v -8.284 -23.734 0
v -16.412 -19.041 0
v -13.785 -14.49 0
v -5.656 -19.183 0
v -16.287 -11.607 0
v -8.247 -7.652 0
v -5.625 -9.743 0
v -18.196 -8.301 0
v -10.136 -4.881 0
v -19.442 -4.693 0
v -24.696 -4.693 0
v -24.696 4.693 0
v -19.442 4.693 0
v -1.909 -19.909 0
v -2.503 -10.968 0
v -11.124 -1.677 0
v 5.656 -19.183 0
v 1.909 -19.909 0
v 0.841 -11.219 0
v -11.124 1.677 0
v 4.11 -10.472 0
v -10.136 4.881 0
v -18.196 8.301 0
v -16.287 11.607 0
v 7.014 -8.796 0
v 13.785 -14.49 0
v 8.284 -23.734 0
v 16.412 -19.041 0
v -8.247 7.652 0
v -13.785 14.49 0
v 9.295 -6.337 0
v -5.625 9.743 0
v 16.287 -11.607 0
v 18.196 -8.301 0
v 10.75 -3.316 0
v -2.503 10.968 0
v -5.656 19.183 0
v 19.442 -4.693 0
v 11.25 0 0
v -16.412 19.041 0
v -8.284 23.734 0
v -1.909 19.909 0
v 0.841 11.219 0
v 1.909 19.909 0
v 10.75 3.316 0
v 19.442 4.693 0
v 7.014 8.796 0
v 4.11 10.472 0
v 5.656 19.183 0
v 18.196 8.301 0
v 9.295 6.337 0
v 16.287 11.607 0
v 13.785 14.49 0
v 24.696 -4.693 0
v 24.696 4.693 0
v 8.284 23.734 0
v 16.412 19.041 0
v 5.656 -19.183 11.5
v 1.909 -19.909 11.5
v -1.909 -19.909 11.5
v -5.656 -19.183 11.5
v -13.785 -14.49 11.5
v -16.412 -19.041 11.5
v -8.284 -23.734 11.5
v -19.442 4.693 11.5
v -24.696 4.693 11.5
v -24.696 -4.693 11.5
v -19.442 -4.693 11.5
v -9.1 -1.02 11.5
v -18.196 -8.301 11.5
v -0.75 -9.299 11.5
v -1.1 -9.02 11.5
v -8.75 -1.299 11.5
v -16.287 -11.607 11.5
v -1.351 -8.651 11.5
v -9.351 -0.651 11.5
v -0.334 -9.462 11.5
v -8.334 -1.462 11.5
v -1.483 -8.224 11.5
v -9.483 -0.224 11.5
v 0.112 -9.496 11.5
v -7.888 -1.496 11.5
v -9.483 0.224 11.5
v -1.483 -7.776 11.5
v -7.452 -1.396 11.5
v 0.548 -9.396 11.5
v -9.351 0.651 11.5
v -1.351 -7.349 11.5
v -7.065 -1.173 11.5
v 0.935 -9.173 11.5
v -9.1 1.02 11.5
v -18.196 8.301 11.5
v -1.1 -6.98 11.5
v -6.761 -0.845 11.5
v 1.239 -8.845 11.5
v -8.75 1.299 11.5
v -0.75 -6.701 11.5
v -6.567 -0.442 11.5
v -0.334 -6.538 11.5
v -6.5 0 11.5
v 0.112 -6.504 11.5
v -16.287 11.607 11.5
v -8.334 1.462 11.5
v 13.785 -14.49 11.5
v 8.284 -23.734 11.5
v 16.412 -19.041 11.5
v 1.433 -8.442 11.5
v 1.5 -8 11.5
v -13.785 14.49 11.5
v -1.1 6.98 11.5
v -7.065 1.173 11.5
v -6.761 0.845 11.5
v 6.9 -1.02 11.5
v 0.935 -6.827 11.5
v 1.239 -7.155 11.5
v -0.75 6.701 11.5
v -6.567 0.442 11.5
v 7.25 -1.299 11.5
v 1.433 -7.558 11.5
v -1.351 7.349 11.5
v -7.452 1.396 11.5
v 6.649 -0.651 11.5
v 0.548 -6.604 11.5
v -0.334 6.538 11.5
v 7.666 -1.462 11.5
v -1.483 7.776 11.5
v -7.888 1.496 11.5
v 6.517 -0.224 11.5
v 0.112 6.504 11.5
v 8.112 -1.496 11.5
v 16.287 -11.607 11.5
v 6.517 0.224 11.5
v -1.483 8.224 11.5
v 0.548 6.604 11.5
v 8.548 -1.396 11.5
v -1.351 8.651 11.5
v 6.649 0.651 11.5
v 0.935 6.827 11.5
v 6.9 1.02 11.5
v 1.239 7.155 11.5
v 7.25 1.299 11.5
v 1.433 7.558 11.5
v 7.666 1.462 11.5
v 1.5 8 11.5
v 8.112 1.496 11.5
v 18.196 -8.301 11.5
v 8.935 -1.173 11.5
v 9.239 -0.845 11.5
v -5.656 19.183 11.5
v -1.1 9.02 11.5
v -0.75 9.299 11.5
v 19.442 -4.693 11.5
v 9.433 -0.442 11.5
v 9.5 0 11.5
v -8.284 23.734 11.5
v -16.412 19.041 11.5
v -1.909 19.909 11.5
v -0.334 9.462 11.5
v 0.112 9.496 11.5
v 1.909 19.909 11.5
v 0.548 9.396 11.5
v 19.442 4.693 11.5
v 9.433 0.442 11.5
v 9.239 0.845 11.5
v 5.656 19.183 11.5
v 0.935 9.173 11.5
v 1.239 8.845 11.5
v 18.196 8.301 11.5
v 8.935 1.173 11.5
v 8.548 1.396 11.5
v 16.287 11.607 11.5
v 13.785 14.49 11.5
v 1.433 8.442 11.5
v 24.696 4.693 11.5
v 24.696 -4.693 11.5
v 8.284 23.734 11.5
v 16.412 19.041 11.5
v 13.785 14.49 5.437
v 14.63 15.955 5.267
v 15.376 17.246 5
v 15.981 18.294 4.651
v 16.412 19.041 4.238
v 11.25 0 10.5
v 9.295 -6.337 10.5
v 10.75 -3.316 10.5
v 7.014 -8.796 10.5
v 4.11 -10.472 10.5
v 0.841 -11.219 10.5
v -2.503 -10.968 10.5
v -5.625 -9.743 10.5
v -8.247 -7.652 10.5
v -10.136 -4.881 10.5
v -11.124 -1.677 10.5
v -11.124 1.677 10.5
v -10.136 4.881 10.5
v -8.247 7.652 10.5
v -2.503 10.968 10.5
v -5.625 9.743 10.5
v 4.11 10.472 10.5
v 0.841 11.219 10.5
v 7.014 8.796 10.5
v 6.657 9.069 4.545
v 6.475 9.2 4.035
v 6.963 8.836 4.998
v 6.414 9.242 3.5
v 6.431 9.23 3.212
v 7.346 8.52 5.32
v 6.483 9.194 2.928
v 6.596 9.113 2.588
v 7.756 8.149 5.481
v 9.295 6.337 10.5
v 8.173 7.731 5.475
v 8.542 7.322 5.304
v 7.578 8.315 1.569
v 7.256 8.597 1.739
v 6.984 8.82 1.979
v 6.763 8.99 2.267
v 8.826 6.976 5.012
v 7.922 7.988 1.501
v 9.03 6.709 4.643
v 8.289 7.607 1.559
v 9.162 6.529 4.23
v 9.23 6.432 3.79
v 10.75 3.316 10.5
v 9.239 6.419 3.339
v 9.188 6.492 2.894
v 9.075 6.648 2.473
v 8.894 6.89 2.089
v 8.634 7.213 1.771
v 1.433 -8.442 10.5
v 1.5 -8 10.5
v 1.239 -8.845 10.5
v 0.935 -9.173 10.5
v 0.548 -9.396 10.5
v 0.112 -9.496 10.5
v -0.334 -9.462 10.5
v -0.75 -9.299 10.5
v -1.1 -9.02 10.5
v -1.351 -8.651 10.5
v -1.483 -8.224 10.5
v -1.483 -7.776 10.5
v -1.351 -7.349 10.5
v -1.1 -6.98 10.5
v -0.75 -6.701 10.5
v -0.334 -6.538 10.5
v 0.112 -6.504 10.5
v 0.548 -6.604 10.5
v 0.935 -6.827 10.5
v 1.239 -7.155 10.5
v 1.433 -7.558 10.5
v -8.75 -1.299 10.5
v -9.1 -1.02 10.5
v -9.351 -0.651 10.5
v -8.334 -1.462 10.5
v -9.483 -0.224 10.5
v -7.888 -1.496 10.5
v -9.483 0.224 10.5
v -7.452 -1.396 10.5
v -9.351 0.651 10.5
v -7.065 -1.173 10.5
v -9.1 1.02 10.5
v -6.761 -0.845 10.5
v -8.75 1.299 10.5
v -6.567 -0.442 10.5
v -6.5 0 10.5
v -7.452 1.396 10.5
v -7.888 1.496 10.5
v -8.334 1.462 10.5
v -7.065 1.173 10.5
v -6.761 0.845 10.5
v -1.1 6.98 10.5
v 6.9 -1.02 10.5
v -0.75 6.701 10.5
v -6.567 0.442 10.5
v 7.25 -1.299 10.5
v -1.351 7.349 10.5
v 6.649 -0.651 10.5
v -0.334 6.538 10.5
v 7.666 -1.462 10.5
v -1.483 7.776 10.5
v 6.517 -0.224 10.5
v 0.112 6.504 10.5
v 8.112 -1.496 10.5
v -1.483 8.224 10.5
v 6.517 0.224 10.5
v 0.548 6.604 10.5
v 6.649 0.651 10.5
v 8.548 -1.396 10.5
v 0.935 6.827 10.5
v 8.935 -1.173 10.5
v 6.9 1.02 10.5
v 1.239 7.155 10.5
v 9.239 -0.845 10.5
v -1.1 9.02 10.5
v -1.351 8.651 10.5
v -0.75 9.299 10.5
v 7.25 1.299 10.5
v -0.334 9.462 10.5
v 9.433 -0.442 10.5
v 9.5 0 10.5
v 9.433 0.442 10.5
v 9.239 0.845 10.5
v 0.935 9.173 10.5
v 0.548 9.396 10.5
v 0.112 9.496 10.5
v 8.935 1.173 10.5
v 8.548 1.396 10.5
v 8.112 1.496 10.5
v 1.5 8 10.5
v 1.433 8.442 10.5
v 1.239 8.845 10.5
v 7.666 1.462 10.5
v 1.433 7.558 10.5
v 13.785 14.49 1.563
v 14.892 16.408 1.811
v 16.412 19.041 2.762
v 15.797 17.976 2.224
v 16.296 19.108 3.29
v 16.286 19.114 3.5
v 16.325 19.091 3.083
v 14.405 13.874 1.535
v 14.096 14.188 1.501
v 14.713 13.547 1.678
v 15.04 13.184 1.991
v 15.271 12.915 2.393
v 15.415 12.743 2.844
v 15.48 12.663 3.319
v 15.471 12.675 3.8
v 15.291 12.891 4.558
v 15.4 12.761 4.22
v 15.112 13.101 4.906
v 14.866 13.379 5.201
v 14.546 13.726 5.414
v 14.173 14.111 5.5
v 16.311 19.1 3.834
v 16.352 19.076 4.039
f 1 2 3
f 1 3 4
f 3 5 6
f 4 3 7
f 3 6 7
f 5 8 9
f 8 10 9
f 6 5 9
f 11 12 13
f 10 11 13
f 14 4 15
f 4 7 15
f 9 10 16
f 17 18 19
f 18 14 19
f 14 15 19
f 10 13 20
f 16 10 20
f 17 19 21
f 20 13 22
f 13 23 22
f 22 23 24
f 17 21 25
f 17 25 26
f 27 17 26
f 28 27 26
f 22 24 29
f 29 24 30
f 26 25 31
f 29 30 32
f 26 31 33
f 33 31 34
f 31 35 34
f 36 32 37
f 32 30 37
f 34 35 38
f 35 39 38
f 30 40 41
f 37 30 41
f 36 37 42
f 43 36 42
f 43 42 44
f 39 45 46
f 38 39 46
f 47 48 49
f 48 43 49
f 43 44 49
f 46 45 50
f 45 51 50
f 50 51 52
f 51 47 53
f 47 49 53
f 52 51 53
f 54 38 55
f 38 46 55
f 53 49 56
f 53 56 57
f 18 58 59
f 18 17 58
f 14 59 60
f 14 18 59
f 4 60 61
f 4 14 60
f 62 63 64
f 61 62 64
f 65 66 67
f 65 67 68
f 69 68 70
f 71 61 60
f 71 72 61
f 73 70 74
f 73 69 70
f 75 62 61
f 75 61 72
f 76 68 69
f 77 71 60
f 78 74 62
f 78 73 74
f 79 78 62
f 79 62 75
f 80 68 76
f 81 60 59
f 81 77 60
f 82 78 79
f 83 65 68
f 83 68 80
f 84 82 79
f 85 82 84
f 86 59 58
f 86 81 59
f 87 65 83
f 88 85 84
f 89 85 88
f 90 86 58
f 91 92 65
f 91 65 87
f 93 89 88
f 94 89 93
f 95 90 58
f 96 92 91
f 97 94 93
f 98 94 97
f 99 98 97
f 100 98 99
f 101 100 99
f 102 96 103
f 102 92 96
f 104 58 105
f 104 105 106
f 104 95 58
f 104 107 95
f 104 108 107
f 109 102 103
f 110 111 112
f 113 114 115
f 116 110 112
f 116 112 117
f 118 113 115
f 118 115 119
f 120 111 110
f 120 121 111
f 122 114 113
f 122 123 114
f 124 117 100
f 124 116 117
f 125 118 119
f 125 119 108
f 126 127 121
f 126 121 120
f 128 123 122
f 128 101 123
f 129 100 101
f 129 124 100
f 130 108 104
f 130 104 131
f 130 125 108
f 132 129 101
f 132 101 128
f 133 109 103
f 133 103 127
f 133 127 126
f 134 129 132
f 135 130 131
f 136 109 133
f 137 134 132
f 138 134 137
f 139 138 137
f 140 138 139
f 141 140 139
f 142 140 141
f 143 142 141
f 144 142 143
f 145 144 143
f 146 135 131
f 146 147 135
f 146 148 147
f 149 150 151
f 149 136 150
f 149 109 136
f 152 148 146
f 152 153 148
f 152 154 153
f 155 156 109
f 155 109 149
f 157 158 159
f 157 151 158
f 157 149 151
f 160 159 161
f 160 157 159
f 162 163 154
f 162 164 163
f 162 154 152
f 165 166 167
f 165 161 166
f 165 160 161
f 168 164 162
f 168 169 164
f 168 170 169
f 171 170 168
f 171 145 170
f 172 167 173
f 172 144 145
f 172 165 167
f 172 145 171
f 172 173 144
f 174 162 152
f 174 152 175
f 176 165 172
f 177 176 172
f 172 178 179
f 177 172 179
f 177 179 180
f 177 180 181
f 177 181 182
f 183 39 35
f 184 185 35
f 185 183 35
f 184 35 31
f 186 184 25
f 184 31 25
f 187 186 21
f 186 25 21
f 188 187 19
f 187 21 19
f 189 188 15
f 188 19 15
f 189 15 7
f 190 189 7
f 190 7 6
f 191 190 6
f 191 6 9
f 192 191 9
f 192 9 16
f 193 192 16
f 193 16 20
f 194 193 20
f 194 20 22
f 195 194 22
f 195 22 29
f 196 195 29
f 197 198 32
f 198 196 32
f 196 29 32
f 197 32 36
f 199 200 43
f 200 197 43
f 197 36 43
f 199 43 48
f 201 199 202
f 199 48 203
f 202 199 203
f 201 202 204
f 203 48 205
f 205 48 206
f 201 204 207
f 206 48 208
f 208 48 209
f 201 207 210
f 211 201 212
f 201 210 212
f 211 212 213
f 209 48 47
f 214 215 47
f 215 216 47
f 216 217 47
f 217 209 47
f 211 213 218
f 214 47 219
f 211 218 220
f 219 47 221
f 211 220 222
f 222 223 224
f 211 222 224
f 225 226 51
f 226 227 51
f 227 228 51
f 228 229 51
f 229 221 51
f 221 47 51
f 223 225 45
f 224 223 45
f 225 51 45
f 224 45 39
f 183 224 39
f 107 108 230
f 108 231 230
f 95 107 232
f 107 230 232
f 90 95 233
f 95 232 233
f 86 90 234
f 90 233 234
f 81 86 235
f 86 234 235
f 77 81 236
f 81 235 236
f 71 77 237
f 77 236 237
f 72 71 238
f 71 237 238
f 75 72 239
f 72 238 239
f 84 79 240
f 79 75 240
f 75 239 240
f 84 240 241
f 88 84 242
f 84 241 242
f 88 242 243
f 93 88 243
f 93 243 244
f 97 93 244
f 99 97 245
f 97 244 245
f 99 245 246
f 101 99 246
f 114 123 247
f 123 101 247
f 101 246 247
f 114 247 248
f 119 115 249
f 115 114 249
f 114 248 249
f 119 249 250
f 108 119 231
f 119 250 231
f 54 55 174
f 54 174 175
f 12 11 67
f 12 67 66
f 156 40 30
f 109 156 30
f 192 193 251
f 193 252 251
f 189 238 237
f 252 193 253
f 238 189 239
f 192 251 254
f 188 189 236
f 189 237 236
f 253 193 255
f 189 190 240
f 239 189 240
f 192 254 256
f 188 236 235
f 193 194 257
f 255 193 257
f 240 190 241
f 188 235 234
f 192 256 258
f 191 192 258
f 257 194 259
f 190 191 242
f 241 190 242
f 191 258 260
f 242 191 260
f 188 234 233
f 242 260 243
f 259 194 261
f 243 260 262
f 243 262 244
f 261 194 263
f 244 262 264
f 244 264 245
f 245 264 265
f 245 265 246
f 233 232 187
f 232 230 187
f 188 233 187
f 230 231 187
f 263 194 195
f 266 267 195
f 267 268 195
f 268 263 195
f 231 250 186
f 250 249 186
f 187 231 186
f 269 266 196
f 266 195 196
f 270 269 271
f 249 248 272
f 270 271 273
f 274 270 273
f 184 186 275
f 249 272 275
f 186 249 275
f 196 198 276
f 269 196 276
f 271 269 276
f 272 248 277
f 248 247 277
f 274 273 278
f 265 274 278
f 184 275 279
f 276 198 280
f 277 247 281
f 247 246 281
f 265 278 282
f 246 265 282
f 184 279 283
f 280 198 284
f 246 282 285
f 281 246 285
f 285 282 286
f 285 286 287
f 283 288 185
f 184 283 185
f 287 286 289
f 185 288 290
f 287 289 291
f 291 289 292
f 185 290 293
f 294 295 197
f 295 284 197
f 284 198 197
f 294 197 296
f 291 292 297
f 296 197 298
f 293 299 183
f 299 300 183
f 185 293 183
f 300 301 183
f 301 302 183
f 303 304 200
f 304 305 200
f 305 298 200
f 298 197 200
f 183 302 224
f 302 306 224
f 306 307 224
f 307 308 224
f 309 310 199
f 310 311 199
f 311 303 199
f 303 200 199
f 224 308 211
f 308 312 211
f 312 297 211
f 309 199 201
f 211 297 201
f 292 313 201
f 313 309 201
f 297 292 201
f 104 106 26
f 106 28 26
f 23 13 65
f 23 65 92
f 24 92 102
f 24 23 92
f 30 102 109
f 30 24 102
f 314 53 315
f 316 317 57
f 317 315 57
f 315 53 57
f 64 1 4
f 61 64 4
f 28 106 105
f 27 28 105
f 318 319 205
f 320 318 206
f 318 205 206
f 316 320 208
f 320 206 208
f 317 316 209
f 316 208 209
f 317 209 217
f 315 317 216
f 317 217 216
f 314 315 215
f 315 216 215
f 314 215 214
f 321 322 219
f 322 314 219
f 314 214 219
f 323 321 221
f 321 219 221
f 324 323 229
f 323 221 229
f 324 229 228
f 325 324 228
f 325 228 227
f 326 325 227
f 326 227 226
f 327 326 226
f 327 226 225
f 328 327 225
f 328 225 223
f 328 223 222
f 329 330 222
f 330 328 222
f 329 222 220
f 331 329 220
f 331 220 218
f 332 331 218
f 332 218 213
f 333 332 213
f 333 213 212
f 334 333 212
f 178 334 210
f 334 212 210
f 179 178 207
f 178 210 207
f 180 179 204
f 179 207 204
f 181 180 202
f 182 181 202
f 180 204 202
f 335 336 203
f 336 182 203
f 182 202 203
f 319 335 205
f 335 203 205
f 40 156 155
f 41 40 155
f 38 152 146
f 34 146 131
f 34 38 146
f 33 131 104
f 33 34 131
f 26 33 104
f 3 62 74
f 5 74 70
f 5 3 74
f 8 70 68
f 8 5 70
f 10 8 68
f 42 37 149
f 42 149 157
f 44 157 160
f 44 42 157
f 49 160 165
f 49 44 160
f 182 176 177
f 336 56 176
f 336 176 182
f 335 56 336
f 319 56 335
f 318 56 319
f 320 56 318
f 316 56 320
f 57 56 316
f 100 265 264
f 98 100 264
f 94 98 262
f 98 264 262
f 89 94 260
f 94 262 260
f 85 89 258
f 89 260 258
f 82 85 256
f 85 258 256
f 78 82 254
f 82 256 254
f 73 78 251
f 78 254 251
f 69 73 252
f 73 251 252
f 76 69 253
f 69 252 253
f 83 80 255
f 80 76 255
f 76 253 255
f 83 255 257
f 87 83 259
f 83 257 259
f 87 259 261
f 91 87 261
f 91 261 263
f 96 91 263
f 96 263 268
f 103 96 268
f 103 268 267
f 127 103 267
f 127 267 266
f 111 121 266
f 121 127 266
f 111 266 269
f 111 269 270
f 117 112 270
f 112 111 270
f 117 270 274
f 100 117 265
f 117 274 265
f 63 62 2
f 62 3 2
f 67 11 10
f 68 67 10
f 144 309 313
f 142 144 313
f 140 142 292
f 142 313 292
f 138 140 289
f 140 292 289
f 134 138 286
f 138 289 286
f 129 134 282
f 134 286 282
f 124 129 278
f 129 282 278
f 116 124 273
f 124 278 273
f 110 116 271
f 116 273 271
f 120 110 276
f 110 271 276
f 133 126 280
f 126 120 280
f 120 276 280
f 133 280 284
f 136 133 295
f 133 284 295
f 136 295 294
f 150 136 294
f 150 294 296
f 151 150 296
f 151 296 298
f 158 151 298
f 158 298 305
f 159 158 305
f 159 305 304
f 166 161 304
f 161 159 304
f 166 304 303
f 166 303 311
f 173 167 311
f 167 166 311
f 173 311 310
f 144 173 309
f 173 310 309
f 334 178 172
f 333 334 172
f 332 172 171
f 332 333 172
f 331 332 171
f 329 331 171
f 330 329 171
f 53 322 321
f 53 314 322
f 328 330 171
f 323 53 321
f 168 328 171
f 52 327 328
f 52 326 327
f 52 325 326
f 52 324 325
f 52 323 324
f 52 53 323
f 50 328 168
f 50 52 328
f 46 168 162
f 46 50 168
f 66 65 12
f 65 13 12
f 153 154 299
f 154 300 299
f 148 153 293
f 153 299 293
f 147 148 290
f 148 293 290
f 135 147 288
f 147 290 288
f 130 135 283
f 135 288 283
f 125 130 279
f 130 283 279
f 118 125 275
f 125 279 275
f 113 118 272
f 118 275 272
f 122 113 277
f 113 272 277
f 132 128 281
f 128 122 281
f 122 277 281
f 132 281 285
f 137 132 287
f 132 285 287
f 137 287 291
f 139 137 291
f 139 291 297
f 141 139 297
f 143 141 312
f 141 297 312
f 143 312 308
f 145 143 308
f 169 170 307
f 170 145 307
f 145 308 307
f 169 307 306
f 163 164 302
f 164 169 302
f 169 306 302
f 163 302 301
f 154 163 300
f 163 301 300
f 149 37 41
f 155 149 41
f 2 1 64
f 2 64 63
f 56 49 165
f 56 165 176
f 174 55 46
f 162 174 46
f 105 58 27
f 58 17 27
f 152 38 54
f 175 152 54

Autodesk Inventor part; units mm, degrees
ref_plane "YZ Plane" through (0, 0, 0) normal (1, 0, 0) x (0, 1, 0)
sketch "Эскиз1" plane through (0, 0, 0) normal (0, 0, 1) x (1, 0, 0)
  line L0 (0, 0) -> (34.5691, 5.4752) construction
  line L1 (0, 0) -> (35, 0) construction
  line L2 (0, 0) -> (34.5691, -5.4752) construction
  circle A0 centre (0, 0) radius 11.25
  circle A1 centre (0, 0) radius 15
  circle A2 centre (0, 0) radius 20
  circle A3 centre (0, 0) radius 30.0525
  circle A4 centre (0, 0) radius 32.0038
  circle A5 centre (0, 0) radius 35
  line L3 (0, 0) -> (17.5, -30.3109) construction
  circle A6 centre (0, -8) radius 1.5
  circle A7 centre (-8, 0) radius 1.5
  line L4 (0, 0) -> (-35, 0) construction
  line L5 (-29.6307, -4.693) -> (-19.4416, -4.693) construction
  line L6 (-29.6307, -4.693) -> (-19.4416, -4.693)
  line L7 (-29.6839, -4.693) -> (-29.6839, 4.693)
  line L8 (-19.4416, 4.693) -> (-34.6839, 4.693) construction
  line L9 (-19.4416, -4.693) -> (-34.6839, -4.693) construction
  line L10 (10.751, 28.0074) -> (5.6565, 19.1834) construction
  line L11 (5.6565, 19.1834) -> (13.2777, 32.3837) construction
  line L12 (-5.6565, 19.1834) -> (-13.2777, 32.3837) construction
  circle A8 centre (0, 8) radius 1.5
  line L13 (0, 0) -> (-17.5, 30.3109) construction
  line L14 (-5.6565, 19.1834) -> (-13.2777, 32.3837)
  line L15 (0, 0) -> (17.5, 30.3109) construction
  line L16 (0, 0) -> (-17.5, -30.3109) construction
  line L17 (5.6565, 19.1834) -> (13.2777, 32.3837)
  line L18 (13.3758, 26.5536) -> (16.0133, 31.1219)
  line L19 (16.3082, 24.8605) -> (18.9457, 29.4289)
  line L20 (18.9457, 29.4289) -> (17.4457, 26.8308) construction
  line L21 (29.6307, 4.693) -> (19.4416, 4.693)
  line L22 (18.8796, -23.3144) -> (13.7851, -14.4904) construction
  line L23 (13.7851, -14.4904) -> (21.4063, -27.6907) construction
  line L24 (29.6839, 4.693) -> (29.6839, 1.693)
  line L25 (29.6839, 4.693) -> (29.6839, -4.693)
  line L26 (29.6839, -4.693) -> (29.6839, -1.693) construction
  circle A9 centre (8, 0) radius 1.5
  line L27 (-18.8796, 23.3144) -> (-13.7851, 14.4904) construction
  line L28 (-13.7851, 14.4904) -> (-21.4063, 27.6907) construction
  line L29 (-18.8796, 23.3144) -> (-13.7851, 14.4904)
  line L30 (-13.7851, 14.4904) -> (-21.4063, 27.6907)
  line L31 (-18.9063, 23.3605) -> (-10.7777, 28.0536)
  line L32 (-16.3082, 24.8605) -> (-18.9457, 29.4289)
  line L33 (-13.3758, 26.5536) -> (-16.0133, 31.1219)
  line L34 (-13.7851, -14.4904) -> (-21.4063, -27.6907) construction
  line L35 (-10.751, -28.0074) -> (-5.6565, -19.1834) construction
  line L36 (-13.7851, -14.4904) -> (-21.4063, -27.6907)
  line L37 (-10.751, -28.0074) -> (-5.6565, -19.1834)
  line L38 (13.7851, 14.4904) -> (21.4063, 27.6907) construction
  line L39 (21.4063, 27.6907) -> (20.1674, 25.5449) construction
  line L40 (10.7777, 28.0536) -> (18.9063, 23.3605)
  line L41 (13.7851, 14.4904) -> (21.4063, 27.6907)
  line L42 (10.751, 28.0074) -> (5.6565, 19.1834)
  line L43 (0, 0) -> (21.2118, 27.8399) construction
  line L44 (0, 0) -> (8, 0) construction
  line L45 (0, 0) -> (0, 8) construction
  line L46 (-10.7777, -28.0536) -> (-18.9063, -23.3605)
  line L47 (-13.3758, -26.5536) -> (-16.0133, -31.1219)
  line L48 (-16.3082, -24.8605) -> (-18.9457, -29.4289)
  line L49 (-5.6565, -19.1834) -> (-13.2777, -32.3837) construction
  line L50 (5.6565, -19.1834) -> (13.2777, -32.3837) construction
  line L51 (-5.6565, -19.1834) -> (-13.2777, -32.3837)
  line L52 (18.8796, -23.3144) -> (13.7851, -14.4904)
  line L53 (5.6565, -19.1834) -> (13.2777, -32.3837)
  line L54 (16.3082, -24.8605) -> (18.9457, -29.4289)
  line L55 (13.7851, -14.4904) -> (21.4063, -27.6907)
  line L56 (13.3758, -26.5536) -> (16.0133, -31.1219)
  line L57 (18.9063, -23.3605) -> (10.7777, -28.0536)
  line L58 (27.6414, 16.1308) -> (28.831, 19.8437)
  line L59 (24.938, 20.0584) -> (28.831, 19.8437)
  line L60 (24.7499, 20.2901) -> (25.3388, 24.1443)
  line L61 (21.4607, 23.742) -> (25.3388, 24.1443)
  line L62 (17.4457, 26.8308) -> (21.2118, 27.8399)
  line L63 (21.2384, 23.9411) -> (21.2118, 27.8399)
  line L64 (-19.4416, 4.693) -> (-34.6839, 4.693)
  line L65 (-17.4453, 26.8311) -> (-21.2113, 27.8403)
  line L66 (-21.238, 23.9415) -> (-21.2113, 27.8403)
  line L67 (-21.4603, 23.7424) -> (-25.3384, 24.1447)
  line L68 (-24.7496, 20.2905) -> (-25.3384, 24.1447)
  line L69 (-24.9377, 20.0588) -> (-28.8307, 19.8442)
  line L70 (-27.6411, 16.1312) -> (-28.8307, 19.8442)
  line L71 (-27.7903, 15.8727) -> (-31.6007, 15.0465)
  line L72 (-29.8401, 11.5678) -> (-31.6007, 15.0465)
  line L73 (-29.9467, 11.289) -> (-33.5789, 9.8719)
  line L74 (-31.2916, 6.7145) -> (-33.5789, 9.8719)
  line L75 (-31.3528, 6.4224) -> (-34.716, 4.45)
  line L76 (-29.6839, -1.693) -> (-34.959, -1.693)
  line L77 (-19.4416, -4.693) -> (-34.6839, -4.693)
  line L78 (-29.6839, 1.693) -> (-34.959, 1.693)
  line L79 (-31.959, 1.693) -> (-34.716, 4.45)
  line L80 (-31.9591, -1.6925) -> (-34.716, -4.4494)
  line L81 (-31.3529, -6.4219) -> (-34.716, -4.4494)
  line L82 (-31.2917, -6.714) -> (-33.5791, -9.8714)
  line L83 (-29.9469, -11.2885) -> (-33.5791, -9.8714)
  line L84 (-29.8403, -11.5673) -> (-31.6009, -15.046)
  line L85 (-27.7906, -15.8723) -> (-31.6009, -15.046)
  line L86 (-24.938, -20.0584) -> (-28.831, -19.8437)
  line L87 (-27.6414, -16.1308) -> (-28.831, -19.8437)
  line L88 (-17.4457, -26.8308) -> (-21.2118, -27.8399)
  line L89 (-21.2384, -23.9411) -> (-21.2118, -27.8399)
  line L90 (-21.4607, -23.742) -> (-25.3388, -24.1443)
  line L91 (-24.7499, -20.2901) -> (-25.3388, -24.1443)
  line L92 (-14.5138, -28.5236) -> (-13.5047, -32.2897)
  line L93 (-10.1149, -30.3634) -> (-13.5047, -32.2897)
  line L94 (-9.8313, -30.4564) -> (-8.2407, -34.016)
  line L95 (-5.1973, -31.579) -> (-8.2407, -34.016)
  line L96 (-4.9026, -31.6261) -> (-2.7702, -34.8902)
  line L97 (-0.1495, -32.0035) -> (-2.7702, -34.8902)
  line L98 (0.149, -32.0035) -> (2.7697, -34.8902)
  line L99 (-14.5133, 28.5238) -> (-13.5042, 32.2899)
  line L100 (-10.1144, 30.3635) -> (-13.5042, 32.2899)
  line L101 (-9.8308, 30.4565) -> (-8.2401, 34.0162)
  line L102 (-5.1968, 31.5791) -> (-8.2401, 34.0162)
  line L103 (14.5138, 28.5236) -> (13.5047, 32.2897)
  line L104 (10.1149, 30.3634) -> (13.5047, 32.2897)
  line L105 (9.8313, 30.4564) -> (8.2407, 34.016)
  line L106 (5.1973, 31.579) -> (8.2407, 34.016)
  line L107 (4.9026, 31.6261) -> (2.7702, 34.8902)
  line L108 (0.1495, 32.0035) -> (2.7702, 34.8902)
  line L109 (-4.9021, 31.6262) -> (-2.7697, 34.8902)
  line L110 (-0.149, 32.0035) -> (-2.7697, 34.8902)
  line L111 (14.5133, -28.5238) -> (13.5042, -32.2899)
  line L112 (5.1968, -31.5791) -> (8.2401, -34.0162)
  line L113 (9.8308, -30.4565) -> (8.2401, -34.0162)
  line L114 (10.1144, -30.3635) -> (13.5042, -32.2899)
  line L115 (17.4453, -26.8311) -> (21.2113, -27.8403)
  line L116 (21.238, -23.9415) -> (21.2113, -27.8403)
  line L117 (4.9021, -31.6262) -> (2.7697, -34.8902)
  line L118 (19.4416, -4.693) -> (34.6839, -4.693)
  line L119 (29.6839, -1.693) -> (34.959, -1.693)
  line L120 (21.4603, -23.7424) -> (25.3384, -24.1447)
  line L121 (24.7496, -20.2905) -> (25.3384, -24.1447)
  line L122 (24.9377, -20.0588) -> (28.8307, -19.8442)
  line L123 (27.6411, -16.1312) -> (28.8307, -19.8442)
  line L124 (27.7903, -15.8727) -> (31.6007, -15.0465)
  line L125 (29.9467, -11.289) -> (33.5789, -9.8719)
  line L126 (31.2916, -6.7145) -> (33.5789, -9.8719)
  line L127 (31.3528, -6.4224) -> (34.716, -4.45)
  line L128 (31.959, -1.693) -> (34.716, -4.45)
  line L129 (29.8401, -11.5678) -> (31.6007, -15.0465)
  line L130 (34.5691, 5.4752) -> (29.6307, 4.693) construction
  line L131 (19.4416, 4.693) -> (34.6839, 4.693)
  line L132 (34.6839, 4.693) -> (29.6839, 4.693) construction
  line L133 (29.6839, 1.693) -> (34.959, 1.693)
  line L134 (29.8403, 11.5673) -> (31.6009, 15.046)
  line L135 (31.2917, 6.714) -> (33.5791, 9.8714)
  line L136 (31.9591, 1.6925) -> (34.716, 4.4494)
  line L137 (31.3529, 6.4219) -> (34.716, 4.4494)
  line L138 (29.9469, 11.2885) -> (33.5791, 9.8714)
  line L139 (27.7906, 15.8723) -> (31.6009, 15.046)
  circle A10 centre (0, 0) radius 36.5
  line L140 (0, 0) -> (-24.7487, 24.7487) construction
  line L141 (0, 0) -> (35, 0) construction
  line L142 (0, 0) -> (-24.6962, 0) construction
  line L143 (-24.6962, -4.693) -> (-24.6962, 4.693)
  line L144 (-8.2838, -23.734) -> (-16.4124, -19.041)
  line L145 (16.4124, -19.041) -> (8.2838, -23.734)
  line L146 (24.6962, 4.693) -> (24.6962, -4.693)
  line L147 (8.2838, 23.734) -> (16.4124, 19.041)
  line L148 (-16.4124, 19.041) -> (-8.2838, 23.734)
  line L149 (0, 0) -> (21.2503, 21.2503) construction
  line L150 (0, 0) -> (30.0525, 0) construction
  line L151 (14.1421, 14.1421) -> (23.5912, 4.693)
  line L152 (23.5912, 4.693) -> (-6.168, 34.4522)
  point P0 (0, 0)
  point P1 (18.9062, 23.3604)
  point P2 (18.9055, 23.3609)
  point P3 (10.7784, 28.0531)
  point P4 (-10.7784, 28.0531)
  point P5 (-18.9055, 23.3609)
  point P6 (-18.9062, 23.3604)
  point P7 (-29.6838, 4.693)
  point P8 (-29.6839, 4.6922)
  point P9 (-29.6839, -4.6922)
  point P10 (-18.9055, -23.3609)
  point P11 (-10.7784, -28.0531)
  point P12 (-10.7776, -28.0534)
  point P13 (10.7776, -28.0534)
  point P14 (10.7784, -28.0531)
  point P15 (18.9055, -23.3609)
  point P16 (29.6839, -4.6922)
  point P17 (29.6839, 4.6922)
  point P18 (29.6838, 4.693)
  point P19 (-29.6838, -4.693)
  point P20 (-18.9062, -23.3604)
  point P21 (18.9062, -23.3604)
  point P22 (29.6838, -4.693)
  point P23 (10.7776, 28.0534)
  point P24 (-10.7776, 28.0534)
  point P25 (-24.6962, 4.693)
  point P26 (24.6962, -4.693)
  dimension "d10" = 70
  dimension "d21" = 60.105
  dimension "d11" = 40
  dimension "d12" = 9
  dimension "d13" = 5
  dimension "d14" = 360
  dimension "d15" = 360
  dimension "d16" = 5
  dimension "d17" = 90
  dimension "d18" = 3
  dimension "d19" = 3
  dimension "d20" = 360
  dimension "d22" = 3
  dimension "d23" = 45
  dimension "d24" = 45.392
  dimension "d25" = 360
  dimension "d26" = 22.5
  dimension "d27" = 8
  dimension "d28" = 3
  dimension "d29" = 8
  dimension "d30" = 3
  dimension "d31" = 30
  dimension "d32" = 73
  dimension "d45" = 135
  dimension "d48" = 360
  dimension "d54" = 45
extrude "Выдавливание1" add sketch "Эскиз1" along normal blind 10.5 contours A1 | A2
extrude "Выдавливание4" add sketch "Эскиз1" along normal blind 1 from surface at 10.5 contours A0 | A1 | A2
ref_plane "РабПлоскость1" through (-24.7024, -23.7395, 10.5) normal (0, 0, 1) x (1, 0, 0)
ref_plane "РабПлоскость2" through (-24.7024, -23.7395, 9) normal (0, 0, -1) x (0, 1, 0)
extrude "Выдавливание7" add sketch "Эскиз1" along normal blind 11.5 contours A2 L21 L146 L118 | L52 L145 L53 A2 | A2 L17 L152 L41 | L152 L17 L147 L41 | L37 L144 L36 A2 | A2 L29 L148 L14 | L6 L143 L64 A2
ref_plane "РабПлоскость3" through (23.5912, 4.693, 0) normal (0.7071068, 0.7071068, 0) x (-0.7071068, 0.7071068, 0)
sketch "Эскиз2" plane through (23.5912, 4.693, 0) normal (0.7071068, 0.7071068, 0) x (-0.7071068, 0.7071068, 0)
  line L0 (13.363, 0) -> (13.363, 3.5)
  line L1 (13.8618, 0) -> (13.8618, 11.5) projected
  line L2 (13.363, 0) -> (16.863, 0) construction
  circle A0 centre (13.363, 3.5) radius 2
  dimension "d56" = 3.5
  dimension "d57" = 90
  dimension "d58" = 4
extrude "Выдавливание8" cut sketch "Эскиз2" along normal blind 5.1 and the other way blind 9
properties part number "inside_part_wheel"
